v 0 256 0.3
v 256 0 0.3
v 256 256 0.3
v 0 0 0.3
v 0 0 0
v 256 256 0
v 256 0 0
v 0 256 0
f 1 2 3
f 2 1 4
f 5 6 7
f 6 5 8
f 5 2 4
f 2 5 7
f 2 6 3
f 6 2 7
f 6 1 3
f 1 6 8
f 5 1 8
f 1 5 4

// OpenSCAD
width = 256;
height = 256;
depth = 0.3;

cube([width, height, depth]);
